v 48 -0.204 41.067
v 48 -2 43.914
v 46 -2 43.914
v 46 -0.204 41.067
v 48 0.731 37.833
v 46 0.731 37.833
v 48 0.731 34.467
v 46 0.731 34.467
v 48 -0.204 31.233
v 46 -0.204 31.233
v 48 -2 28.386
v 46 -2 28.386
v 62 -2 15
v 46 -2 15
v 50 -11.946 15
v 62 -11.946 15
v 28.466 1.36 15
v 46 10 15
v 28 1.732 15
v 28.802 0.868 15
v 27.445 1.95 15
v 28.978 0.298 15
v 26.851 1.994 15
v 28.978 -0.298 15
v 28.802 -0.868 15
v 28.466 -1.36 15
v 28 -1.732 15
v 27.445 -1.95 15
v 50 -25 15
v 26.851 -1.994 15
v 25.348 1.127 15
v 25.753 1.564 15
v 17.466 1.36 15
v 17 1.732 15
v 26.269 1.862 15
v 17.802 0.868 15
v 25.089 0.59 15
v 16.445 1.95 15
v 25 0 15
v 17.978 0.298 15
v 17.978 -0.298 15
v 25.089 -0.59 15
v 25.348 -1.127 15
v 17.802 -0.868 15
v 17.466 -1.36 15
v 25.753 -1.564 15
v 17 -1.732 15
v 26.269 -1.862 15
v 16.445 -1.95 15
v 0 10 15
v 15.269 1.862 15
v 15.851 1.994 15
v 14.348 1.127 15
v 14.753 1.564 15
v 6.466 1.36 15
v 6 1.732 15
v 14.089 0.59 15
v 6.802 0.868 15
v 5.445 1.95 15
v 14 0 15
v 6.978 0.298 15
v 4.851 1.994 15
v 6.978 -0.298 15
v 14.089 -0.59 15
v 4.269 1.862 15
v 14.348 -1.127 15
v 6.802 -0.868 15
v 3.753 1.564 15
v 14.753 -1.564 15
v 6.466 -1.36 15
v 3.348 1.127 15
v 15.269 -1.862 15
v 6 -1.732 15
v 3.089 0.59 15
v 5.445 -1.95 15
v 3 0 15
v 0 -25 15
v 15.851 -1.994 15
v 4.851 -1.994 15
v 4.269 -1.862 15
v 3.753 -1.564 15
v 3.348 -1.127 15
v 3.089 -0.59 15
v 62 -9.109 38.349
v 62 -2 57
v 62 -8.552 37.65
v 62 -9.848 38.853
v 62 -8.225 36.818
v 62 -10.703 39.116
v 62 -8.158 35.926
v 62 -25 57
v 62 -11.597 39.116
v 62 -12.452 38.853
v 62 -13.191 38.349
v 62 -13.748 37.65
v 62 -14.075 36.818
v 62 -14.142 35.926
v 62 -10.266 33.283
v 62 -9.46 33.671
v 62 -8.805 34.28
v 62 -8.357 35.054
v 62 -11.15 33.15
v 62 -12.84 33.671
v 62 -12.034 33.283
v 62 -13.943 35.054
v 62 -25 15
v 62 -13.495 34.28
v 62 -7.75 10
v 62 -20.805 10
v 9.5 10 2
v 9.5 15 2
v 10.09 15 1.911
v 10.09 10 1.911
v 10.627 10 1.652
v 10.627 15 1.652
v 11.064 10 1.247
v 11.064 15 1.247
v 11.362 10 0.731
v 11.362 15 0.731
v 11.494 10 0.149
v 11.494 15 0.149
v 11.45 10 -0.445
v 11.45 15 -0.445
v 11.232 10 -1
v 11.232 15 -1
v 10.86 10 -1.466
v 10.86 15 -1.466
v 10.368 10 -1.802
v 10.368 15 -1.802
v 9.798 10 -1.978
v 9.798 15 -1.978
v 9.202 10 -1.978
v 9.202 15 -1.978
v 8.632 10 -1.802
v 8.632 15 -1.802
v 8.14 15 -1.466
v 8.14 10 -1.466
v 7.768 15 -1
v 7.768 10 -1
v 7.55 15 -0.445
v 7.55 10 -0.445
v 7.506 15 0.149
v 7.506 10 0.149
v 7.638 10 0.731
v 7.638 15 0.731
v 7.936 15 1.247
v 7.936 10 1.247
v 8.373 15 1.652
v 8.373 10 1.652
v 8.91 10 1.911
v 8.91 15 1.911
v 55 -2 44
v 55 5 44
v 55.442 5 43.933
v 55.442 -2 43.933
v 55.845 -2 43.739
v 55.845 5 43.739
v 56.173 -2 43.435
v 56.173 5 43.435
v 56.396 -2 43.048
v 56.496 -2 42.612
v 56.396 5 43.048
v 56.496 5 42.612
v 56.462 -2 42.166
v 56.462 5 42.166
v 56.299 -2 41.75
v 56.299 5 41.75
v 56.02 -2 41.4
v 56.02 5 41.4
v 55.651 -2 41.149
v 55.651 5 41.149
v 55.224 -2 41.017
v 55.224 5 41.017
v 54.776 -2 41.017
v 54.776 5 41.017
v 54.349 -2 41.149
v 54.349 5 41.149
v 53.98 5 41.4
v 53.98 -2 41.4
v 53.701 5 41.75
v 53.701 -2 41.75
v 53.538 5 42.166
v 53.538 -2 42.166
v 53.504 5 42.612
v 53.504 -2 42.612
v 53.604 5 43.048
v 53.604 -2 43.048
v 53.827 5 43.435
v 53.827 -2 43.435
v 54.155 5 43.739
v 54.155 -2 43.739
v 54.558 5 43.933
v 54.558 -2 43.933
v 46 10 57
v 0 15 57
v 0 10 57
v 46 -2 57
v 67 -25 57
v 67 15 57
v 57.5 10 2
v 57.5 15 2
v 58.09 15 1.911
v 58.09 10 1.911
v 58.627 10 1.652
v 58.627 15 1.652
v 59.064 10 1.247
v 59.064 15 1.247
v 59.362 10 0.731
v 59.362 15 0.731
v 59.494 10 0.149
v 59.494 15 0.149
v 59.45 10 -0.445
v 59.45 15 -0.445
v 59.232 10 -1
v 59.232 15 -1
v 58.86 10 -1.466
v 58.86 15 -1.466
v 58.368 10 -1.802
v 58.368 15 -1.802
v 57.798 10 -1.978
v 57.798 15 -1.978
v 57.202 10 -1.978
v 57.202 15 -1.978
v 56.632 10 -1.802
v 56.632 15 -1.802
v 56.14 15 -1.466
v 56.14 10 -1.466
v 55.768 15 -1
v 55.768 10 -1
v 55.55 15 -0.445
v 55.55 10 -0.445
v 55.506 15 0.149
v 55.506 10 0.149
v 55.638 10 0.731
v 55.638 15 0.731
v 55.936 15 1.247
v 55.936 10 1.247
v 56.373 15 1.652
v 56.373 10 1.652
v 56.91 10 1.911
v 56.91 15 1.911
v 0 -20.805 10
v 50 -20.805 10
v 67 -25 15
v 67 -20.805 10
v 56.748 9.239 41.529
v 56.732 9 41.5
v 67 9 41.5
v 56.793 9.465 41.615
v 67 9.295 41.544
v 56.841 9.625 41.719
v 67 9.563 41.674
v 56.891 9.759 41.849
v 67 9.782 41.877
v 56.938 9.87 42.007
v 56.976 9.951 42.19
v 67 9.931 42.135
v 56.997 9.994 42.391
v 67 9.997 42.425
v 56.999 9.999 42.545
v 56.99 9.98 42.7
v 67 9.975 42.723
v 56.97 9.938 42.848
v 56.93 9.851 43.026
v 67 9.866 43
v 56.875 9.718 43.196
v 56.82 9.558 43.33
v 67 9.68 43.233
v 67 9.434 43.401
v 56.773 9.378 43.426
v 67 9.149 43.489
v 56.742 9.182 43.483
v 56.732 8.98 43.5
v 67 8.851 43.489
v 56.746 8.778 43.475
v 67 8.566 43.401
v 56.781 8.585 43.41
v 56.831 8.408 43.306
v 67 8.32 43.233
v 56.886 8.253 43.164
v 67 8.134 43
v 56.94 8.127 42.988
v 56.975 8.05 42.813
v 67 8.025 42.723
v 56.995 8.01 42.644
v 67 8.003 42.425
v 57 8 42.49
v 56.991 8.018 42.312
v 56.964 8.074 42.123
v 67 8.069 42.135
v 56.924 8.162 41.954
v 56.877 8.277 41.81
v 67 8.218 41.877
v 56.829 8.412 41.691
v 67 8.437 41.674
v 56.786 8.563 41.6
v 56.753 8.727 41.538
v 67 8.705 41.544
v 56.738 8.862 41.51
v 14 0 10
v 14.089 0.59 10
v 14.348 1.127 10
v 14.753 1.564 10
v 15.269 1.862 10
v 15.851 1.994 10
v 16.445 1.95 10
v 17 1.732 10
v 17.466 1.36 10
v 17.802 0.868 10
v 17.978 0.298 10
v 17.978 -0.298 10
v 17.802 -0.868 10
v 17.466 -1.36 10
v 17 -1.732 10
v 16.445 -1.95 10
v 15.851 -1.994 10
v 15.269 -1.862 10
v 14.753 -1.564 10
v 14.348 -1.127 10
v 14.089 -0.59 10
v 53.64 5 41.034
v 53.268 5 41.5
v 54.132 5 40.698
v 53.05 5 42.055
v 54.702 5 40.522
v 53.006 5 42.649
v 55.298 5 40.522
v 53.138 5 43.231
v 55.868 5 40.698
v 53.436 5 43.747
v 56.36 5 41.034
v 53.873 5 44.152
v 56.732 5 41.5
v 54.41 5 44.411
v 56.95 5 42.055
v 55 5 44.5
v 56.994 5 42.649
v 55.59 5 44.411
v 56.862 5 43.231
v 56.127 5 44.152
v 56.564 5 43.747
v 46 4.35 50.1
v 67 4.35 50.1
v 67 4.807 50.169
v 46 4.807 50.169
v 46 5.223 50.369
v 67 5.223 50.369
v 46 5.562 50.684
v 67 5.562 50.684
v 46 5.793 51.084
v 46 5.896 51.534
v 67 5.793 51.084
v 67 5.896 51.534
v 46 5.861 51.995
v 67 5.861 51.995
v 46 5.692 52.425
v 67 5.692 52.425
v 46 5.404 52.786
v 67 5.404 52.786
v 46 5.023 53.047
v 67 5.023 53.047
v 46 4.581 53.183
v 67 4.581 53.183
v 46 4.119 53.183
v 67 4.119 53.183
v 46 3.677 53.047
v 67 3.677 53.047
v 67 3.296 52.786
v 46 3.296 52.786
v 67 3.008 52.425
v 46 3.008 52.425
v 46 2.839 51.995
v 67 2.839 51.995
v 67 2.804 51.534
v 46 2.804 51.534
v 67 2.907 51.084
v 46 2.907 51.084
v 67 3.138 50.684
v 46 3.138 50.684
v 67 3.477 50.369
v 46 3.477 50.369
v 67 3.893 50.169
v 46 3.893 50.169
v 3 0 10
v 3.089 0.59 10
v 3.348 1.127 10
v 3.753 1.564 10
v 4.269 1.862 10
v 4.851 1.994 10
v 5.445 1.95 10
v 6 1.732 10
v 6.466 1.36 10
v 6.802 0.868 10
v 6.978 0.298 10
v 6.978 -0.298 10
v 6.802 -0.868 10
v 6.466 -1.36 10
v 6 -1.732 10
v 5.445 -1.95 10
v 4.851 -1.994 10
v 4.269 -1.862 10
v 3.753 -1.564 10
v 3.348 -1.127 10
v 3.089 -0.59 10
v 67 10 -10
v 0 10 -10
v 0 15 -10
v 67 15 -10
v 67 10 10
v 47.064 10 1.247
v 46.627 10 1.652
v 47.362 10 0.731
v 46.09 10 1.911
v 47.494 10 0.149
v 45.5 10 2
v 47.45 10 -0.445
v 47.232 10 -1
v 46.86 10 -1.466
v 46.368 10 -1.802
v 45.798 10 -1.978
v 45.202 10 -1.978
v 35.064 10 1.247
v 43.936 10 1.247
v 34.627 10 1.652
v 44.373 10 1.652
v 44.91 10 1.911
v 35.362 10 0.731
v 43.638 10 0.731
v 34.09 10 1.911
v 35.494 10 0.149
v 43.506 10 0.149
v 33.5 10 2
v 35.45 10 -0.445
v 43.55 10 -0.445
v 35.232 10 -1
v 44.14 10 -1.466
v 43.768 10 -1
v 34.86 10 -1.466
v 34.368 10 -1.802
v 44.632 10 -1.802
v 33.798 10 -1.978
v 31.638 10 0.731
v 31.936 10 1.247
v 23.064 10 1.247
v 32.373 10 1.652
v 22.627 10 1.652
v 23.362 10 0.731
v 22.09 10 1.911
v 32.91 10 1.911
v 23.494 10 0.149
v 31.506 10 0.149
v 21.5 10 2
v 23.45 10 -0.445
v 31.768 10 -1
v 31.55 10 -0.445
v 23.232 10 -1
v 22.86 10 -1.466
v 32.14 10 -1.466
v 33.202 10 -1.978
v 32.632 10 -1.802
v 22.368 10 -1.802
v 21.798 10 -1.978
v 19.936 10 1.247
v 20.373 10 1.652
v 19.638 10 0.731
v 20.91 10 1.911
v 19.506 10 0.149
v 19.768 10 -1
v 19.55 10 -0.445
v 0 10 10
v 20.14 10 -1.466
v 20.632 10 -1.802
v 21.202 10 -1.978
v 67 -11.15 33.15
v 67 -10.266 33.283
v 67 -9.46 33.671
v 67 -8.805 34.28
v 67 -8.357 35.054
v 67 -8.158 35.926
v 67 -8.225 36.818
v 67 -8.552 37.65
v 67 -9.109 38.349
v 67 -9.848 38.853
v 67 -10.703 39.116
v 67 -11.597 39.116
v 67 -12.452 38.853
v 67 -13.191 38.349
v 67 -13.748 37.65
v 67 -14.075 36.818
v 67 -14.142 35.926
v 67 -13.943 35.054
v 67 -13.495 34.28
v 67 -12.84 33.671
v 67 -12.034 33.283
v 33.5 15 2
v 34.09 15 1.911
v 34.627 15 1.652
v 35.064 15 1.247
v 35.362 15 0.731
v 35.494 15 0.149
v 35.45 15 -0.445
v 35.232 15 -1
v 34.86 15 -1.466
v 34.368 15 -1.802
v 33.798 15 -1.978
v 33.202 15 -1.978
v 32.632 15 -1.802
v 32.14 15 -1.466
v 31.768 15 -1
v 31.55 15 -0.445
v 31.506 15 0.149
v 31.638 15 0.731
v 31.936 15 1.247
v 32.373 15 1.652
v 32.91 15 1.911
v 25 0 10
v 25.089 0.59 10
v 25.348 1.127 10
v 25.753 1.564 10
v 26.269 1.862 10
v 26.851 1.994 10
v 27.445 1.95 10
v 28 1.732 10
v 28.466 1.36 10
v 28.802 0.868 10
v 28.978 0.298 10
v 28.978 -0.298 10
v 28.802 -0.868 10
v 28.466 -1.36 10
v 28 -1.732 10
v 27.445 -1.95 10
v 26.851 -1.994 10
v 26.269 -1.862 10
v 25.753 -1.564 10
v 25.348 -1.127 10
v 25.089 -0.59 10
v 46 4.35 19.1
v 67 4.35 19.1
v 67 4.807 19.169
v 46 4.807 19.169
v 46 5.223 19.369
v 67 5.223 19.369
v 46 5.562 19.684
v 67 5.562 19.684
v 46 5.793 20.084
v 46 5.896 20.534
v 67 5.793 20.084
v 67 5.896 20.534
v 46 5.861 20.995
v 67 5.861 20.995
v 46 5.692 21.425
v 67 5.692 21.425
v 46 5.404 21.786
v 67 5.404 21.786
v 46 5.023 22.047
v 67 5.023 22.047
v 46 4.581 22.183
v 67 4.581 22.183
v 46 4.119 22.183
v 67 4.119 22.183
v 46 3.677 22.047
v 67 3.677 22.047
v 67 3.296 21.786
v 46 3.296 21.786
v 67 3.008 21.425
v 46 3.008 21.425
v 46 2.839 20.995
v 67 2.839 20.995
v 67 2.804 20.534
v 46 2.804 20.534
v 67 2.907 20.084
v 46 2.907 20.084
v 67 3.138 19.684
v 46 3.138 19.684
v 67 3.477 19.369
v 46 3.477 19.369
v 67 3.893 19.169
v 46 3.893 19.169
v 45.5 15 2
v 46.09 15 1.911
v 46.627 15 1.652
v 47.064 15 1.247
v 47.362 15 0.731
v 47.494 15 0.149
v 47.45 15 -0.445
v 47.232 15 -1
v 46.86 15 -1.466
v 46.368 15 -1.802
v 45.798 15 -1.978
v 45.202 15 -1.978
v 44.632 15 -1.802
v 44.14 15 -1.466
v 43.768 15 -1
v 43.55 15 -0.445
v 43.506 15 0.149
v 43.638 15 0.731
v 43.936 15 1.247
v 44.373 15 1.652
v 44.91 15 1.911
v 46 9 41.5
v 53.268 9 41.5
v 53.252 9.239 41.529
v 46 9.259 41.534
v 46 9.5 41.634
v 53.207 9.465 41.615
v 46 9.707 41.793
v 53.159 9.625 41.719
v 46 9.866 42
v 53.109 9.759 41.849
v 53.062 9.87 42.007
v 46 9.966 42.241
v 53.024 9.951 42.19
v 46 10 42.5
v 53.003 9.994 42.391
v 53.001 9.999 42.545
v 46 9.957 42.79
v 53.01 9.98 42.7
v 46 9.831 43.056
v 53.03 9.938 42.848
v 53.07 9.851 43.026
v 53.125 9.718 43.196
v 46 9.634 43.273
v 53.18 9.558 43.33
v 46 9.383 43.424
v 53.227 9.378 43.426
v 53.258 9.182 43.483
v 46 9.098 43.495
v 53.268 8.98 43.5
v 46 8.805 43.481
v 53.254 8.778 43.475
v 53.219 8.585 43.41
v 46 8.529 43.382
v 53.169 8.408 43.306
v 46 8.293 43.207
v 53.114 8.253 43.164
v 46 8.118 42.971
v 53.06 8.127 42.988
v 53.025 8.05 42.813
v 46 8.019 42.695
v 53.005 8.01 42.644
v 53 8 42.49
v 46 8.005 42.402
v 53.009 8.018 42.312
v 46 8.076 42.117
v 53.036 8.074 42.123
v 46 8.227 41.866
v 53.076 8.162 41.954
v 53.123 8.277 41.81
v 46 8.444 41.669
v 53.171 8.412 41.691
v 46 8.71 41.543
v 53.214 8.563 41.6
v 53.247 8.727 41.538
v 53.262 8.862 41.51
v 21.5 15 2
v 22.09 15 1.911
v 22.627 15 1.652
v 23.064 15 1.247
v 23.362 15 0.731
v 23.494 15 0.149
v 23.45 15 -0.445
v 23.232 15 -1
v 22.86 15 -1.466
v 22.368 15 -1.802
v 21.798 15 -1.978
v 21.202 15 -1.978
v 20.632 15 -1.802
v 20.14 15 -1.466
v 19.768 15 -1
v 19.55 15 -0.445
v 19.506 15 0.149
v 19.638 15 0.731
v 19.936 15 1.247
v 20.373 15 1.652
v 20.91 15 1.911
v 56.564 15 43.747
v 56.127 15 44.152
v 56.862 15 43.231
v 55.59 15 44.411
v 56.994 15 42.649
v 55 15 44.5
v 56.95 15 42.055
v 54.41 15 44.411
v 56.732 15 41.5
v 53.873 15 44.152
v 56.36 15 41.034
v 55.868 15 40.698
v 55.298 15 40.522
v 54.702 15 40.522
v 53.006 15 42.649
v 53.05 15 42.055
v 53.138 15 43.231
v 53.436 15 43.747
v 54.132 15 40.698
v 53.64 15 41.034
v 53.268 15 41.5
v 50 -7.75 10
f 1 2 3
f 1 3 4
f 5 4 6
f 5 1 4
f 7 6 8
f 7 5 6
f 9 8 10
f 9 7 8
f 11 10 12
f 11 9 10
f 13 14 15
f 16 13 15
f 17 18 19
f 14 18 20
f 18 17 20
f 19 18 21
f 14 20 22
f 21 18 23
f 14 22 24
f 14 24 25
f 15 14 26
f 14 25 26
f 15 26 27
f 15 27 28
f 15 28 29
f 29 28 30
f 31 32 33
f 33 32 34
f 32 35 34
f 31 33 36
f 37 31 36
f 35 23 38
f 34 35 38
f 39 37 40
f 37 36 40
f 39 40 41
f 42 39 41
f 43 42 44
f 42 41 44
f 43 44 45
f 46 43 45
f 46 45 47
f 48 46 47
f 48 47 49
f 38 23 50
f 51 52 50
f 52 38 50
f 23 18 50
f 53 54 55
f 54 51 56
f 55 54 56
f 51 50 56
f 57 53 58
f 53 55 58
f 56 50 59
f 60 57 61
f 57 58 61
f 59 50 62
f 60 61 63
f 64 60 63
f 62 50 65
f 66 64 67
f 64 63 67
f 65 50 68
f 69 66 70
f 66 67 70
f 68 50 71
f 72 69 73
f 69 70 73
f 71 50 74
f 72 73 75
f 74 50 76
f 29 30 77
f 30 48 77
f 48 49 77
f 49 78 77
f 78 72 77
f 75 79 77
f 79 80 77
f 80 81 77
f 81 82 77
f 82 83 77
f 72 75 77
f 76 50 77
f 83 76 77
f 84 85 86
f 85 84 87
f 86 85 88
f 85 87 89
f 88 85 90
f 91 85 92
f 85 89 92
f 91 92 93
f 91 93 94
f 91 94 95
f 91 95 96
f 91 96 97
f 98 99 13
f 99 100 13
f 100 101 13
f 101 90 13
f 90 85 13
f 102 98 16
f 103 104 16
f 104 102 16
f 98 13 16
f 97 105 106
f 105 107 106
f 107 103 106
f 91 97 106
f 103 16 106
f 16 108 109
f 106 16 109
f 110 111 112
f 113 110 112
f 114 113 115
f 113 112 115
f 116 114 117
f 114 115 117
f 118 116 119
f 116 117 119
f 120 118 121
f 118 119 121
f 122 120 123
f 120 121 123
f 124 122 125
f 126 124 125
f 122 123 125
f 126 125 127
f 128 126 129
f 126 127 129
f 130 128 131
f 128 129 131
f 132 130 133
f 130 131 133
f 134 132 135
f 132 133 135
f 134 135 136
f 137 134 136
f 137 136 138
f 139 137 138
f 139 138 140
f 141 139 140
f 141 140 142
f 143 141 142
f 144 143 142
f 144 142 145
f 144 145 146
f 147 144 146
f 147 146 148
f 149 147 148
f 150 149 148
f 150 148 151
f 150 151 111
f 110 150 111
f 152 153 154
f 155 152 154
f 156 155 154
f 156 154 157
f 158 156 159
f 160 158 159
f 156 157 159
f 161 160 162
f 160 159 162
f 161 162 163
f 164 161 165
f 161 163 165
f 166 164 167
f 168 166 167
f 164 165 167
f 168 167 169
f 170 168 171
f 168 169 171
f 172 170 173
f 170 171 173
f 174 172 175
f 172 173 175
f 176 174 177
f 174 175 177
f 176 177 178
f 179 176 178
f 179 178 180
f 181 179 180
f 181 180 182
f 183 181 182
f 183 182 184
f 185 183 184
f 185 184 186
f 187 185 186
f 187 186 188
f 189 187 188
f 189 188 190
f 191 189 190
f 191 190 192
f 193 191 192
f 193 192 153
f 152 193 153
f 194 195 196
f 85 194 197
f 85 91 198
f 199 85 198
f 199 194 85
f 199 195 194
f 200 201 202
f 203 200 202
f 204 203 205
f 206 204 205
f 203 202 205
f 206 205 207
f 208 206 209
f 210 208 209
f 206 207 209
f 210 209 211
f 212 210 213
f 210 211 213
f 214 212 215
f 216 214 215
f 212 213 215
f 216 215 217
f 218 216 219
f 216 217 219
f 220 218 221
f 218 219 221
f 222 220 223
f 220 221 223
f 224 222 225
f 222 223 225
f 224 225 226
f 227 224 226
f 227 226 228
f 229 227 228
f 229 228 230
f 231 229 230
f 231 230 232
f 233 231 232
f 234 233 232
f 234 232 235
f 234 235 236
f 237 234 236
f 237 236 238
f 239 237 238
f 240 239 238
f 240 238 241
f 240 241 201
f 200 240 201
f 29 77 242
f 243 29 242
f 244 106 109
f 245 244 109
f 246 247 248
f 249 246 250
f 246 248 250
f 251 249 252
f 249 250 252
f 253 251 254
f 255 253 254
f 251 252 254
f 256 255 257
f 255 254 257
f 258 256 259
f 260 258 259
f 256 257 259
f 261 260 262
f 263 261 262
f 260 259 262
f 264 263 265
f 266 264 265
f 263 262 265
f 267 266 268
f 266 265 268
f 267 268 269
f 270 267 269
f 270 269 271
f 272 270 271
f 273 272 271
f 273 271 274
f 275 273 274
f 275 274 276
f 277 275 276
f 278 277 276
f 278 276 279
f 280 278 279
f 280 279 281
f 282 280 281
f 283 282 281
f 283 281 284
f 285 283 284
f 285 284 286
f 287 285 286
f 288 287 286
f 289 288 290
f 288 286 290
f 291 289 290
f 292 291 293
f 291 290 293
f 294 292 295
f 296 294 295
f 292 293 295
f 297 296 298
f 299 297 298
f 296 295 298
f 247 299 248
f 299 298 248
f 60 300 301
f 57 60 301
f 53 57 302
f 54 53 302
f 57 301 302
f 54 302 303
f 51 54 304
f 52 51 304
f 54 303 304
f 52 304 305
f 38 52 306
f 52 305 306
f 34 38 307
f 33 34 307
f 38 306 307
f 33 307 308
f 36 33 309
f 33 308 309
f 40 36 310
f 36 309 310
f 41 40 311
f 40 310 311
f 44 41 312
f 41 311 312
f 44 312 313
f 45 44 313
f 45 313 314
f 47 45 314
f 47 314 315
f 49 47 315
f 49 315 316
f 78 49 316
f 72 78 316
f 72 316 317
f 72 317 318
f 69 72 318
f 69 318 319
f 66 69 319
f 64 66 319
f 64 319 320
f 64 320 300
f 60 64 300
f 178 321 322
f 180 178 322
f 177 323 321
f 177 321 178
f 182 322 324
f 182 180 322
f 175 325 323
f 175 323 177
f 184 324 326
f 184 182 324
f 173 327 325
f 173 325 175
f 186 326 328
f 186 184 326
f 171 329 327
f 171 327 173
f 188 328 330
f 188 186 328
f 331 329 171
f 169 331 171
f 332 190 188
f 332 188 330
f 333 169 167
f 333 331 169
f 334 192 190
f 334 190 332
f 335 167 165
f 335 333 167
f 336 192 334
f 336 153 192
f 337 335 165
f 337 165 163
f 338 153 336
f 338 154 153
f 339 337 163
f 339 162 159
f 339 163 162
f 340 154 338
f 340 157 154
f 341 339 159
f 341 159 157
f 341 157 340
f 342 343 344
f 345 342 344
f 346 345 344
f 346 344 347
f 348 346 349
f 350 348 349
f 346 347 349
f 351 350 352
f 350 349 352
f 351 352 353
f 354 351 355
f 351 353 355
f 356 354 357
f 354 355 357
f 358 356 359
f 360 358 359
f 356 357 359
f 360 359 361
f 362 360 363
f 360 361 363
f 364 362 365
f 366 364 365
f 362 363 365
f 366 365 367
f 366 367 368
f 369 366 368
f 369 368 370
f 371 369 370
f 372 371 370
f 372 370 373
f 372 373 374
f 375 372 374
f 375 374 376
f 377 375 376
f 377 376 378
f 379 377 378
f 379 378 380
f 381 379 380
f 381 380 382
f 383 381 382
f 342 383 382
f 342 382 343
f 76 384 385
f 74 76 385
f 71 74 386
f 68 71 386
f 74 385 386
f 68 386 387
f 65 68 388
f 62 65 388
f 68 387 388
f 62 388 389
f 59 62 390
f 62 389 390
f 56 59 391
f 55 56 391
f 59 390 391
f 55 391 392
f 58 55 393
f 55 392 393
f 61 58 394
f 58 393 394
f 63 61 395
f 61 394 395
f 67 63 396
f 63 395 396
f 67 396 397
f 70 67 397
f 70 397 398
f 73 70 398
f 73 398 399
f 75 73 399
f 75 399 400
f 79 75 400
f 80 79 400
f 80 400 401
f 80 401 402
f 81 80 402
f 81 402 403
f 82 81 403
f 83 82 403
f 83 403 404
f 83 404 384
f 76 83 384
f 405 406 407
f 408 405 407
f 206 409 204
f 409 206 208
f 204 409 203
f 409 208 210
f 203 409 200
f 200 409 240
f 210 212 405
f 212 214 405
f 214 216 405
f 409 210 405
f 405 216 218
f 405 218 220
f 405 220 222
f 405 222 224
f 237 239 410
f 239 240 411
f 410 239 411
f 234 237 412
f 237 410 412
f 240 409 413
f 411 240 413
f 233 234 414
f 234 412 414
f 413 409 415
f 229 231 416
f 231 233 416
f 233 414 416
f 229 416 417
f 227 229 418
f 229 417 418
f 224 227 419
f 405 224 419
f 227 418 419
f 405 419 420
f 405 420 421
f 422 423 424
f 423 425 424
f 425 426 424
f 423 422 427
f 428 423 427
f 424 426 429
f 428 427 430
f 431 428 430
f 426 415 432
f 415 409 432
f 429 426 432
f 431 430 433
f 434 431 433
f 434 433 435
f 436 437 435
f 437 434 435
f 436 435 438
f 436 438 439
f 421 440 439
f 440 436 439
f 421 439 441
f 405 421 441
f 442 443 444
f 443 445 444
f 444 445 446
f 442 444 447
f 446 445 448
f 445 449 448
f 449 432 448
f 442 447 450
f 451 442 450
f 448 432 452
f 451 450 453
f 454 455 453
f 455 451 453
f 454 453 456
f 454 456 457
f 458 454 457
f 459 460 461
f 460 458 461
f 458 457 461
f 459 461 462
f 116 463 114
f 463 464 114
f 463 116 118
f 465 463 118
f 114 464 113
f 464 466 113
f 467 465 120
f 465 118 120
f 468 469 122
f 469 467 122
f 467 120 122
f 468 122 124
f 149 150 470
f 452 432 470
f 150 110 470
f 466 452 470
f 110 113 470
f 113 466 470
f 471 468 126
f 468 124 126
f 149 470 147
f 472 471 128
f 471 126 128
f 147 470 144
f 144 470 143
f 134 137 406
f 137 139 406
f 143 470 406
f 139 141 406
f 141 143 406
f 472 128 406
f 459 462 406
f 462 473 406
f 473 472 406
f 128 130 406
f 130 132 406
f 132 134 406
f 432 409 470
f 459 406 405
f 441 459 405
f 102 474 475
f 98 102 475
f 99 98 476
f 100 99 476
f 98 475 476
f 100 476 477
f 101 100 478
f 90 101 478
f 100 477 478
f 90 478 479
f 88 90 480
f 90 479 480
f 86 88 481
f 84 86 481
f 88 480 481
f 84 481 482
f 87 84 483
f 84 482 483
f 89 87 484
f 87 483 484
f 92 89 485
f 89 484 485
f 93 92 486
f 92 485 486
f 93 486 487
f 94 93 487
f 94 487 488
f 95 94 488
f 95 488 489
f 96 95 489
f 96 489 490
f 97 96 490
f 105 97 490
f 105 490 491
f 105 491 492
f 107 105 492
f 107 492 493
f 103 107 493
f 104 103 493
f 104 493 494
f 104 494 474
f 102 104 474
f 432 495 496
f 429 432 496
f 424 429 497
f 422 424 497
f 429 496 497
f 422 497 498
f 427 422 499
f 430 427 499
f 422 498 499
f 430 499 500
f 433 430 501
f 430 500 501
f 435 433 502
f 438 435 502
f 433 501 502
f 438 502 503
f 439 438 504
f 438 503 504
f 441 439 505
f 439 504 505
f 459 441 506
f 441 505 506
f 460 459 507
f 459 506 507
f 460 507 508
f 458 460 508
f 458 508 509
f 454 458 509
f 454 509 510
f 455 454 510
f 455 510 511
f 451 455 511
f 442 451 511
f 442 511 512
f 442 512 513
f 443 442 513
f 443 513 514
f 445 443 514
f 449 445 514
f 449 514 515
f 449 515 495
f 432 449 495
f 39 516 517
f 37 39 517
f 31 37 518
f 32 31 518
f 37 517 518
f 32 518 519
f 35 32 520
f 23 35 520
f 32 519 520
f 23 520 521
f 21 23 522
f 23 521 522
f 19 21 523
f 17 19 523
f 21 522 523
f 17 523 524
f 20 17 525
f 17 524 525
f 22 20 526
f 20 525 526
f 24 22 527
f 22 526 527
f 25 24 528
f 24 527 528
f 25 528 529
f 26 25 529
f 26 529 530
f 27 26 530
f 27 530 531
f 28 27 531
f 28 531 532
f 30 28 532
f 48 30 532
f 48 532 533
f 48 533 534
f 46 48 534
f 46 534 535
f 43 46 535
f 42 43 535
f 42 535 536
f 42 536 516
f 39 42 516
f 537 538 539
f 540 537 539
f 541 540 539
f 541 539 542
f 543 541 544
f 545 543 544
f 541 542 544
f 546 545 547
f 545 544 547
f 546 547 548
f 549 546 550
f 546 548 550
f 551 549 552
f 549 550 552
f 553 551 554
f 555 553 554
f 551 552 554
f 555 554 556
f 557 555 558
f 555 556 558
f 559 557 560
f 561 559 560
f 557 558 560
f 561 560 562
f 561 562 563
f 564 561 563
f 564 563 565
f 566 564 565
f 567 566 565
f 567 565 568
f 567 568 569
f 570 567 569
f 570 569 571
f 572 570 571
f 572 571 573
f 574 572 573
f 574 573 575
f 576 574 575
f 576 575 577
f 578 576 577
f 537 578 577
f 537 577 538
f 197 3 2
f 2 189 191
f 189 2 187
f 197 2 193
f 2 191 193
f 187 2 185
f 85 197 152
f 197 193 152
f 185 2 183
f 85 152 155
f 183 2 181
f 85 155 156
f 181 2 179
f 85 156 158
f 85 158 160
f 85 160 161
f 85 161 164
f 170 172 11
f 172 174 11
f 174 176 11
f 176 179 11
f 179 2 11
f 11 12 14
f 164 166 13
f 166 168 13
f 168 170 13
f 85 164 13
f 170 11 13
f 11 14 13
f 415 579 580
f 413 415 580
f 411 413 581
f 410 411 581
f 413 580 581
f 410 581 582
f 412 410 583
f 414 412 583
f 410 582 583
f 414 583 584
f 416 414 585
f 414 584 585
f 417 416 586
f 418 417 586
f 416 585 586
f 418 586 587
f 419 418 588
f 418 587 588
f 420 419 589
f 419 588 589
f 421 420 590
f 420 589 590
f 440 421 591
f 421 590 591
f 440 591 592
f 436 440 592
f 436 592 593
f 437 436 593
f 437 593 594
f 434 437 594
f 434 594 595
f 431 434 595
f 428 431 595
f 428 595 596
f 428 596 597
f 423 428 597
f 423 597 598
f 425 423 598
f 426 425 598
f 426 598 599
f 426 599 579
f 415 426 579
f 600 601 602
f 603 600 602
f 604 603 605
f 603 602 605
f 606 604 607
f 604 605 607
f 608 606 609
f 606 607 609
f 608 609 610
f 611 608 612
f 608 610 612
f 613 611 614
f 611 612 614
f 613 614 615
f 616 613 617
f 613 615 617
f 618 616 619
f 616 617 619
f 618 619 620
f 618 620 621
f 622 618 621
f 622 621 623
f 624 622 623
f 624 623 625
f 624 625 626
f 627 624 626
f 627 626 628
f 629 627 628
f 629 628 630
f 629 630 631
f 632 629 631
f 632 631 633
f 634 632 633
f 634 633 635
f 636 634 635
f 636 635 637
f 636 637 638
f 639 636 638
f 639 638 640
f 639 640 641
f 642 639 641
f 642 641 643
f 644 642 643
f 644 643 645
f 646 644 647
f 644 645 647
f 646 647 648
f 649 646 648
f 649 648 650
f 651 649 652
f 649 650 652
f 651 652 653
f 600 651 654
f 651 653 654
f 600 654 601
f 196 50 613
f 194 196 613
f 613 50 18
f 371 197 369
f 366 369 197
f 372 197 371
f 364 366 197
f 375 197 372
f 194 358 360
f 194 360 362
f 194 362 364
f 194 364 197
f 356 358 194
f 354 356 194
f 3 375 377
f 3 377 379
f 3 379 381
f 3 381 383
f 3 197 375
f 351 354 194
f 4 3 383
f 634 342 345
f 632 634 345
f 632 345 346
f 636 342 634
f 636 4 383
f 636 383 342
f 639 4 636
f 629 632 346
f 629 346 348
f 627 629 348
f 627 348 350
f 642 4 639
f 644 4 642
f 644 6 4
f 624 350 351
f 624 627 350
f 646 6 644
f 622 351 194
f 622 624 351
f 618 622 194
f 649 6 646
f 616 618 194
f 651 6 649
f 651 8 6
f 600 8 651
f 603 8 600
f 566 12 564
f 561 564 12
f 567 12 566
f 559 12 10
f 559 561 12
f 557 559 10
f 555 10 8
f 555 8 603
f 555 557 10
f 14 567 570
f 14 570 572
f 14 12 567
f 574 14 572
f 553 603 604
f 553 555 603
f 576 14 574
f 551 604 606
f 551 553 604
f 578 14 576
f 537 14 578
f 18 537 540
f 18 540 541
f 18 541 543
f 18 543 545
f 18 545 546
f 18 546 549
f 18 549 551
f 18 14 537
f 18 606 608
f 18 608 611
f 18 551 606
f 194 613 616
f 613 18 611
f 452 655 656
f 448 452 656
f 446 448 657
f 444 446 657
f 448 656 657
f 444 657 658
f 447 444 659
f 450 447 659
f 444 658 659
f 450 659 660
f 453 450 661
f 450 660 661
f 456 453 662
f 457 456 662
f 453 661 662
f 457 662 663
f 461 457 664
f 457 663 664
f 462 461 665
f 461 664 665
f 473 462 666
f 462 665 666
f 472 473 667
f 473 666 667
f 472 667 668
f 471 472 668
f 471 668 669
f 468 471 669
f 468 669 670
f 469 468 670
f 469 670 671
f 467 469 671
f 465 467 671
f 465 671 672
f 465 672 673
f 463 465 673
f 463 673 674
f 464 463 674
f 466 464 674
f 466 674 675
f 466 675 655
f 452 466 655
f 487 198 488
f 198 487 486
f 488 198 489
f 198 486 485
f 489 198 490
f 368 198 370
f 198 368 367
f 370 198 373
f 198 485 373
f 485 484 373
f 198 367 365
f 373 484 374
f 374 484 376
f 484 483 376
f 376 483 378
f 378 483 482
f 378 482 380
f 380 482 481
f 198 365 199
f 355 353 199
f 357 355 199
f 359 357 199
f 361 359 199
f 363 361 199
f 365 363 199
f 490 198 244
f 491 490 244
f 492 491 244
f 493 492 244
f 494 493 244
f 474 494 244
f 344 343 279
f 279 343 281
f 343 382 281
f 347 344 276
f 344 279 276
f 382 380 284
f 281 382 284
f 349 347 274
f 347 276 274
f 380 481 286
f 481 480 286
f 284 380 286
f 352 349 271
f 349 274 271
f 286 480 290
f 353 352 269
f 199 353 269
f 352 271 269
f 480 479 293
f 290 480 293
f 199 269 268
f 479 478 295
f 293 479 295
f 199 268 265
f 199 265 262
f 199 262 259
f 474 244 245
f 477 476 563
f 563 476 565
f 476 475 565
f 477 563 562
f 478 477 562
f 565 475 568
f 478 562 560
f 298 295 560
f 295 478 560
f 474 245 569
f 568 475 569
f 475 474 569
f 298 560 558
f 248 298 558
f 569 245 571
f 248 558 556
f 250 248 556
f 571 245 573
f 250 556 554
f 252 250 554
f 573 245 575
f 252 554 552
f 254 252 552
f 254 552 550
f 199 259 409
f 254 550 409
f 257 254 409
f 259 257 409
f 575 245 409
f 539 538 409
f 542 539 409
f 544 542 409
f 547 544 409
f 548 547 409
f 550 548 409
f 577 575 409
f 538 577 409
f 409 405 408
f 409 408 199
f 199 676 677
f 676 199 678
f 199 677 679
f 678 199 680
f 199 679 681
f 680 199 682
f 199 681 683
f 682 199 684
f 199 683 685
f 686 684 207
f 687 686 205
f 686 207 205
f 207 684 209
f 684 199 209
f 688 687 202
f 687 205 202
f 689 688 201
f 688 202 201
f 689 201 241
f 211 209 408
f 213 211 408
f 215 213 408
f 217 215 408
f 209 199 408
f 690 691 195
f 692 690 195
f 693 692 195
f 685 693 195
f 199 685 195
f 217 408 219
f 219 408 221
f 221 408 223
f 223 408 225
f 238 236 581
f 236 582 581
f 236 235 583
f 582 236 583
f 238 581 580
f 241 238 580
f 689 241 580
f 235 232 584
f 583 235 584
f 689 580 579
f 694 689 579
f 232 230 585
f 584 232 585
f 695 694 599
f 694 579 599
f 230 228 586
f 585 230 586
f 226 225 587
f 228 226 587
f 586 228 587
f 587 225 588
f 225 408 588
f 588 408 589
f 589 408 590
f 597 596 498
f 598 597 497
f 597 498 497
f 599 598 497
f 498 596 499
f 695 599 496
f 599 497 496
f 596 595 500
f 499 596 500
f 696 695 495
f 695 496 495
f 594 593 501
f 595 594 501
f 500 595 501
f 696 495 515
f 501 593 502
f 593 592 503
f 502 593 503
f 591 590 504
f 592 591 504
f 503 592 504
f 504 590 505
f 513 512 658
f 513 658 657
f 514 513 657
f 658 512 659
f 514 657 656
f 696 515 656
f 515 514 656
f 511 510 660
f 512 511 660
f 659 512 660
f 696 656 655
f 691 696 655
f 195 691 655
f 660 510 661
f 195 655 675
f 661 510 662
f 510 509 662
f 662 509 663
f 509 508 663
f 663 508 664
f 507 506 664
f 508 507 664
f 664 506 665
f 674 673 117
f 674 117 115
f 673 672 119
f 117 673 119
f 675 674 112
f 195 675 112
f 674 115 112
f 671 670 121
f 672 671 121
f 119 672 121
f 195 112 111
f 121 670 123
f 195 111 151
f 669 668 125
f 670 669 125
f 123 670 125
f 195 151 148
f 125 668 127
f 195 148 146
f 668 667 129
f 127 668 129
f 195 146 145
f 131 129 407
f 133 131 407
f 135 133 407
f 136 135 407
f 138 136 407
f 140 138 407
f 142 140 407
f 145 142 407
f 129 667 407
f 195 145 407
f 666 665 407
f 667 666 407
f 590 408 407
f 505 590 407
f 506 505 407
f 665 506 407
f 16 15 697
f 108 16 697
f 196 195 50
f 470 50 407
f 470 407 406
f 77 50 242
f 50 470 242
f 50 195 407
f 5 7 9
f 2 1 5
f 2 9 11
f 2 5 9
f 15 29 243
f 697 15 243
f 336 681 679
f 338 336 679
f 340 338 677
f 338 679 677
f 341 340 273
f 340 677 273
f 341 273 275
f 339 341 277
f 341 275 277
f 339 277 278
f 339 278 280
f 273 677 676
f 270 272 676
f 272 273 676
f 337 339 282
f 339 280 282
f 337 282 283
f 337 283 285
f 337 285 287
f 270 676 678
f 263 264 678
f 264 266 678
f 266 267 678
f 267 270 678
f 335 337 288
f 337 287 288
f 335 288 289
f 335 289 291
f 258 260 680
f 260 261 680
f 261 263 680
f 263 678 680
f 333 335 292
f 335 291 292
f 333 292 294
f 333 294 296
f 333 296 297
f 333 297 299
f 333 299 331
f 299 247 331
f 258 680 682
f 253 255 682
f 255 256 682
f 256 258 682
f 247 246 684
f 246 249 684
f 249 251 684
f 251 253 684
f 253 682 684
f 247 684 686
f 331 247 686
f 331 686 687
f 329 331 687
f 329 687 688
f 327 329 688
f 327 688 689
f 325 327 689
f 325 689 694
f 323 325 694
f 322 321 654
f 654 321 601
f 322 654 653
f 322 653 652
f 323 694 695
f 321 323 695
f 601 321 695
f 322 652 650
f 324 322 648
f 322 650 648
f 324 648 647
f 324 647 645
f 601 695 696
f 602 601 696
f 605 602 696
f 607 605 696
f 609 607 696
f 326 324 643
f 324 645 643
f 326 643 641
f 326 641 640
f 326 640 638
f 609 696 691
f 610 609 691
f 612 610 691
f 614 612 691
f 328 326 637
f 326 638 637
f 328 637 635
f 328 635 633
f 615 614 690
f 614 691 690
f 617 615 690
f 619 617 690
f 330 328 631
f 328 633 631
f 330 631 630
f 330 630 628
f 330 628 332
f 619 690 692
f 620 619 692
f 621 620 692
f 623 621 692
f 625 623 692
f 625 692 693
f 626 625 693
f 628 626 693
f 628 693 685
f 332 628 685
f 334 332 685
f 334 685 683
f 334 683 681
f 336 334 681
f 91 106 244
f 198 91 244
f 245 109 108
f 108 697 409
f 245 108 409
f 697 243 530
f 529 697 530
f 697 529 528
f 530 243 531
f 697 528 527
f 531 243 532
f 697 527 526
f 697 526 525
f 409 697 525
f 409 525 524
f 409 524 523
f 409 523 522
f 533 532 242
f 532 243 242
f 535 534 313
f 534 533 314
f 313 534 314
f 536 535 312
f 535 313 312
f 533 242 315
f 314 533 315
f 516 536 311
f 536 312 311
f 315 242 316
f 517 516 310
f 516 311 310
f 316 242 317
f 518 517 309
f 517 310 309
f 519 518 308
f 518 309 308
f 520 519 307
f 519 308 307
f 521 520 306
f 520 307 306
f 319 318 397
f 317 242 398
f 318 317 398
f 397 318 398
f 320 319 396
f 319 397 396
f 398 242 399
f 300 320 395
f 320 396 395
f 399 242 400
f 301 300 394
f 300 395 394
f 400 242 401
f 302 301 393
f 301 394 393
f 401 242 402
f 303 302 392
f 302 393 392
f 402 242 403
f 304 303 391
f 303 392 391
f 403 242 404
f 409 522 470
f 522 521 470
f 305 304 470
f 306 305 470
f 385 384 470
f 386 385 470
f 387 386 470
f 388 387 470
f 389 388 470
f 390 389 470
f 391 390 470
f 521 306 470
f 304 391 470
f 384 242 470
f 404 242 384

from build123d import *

# Parameters (mm, degrees)
BOSS_EXTRUDE1_DEPTH = 50
BOSS_EXTRUDE2_DEPTH = 12
BOSS_EXTRUDE3_DEPTH = 5
SKETCH5_W           = 16
SKETCH5_H           = 12
BOSS_EXTRUDE4_DEPTH = 42
SKETCH6_R           = 3
CUT_EXTRUDE1_DEPTH  = 92.449439583
CUT_EXTRUDE2_START  = 14
SKETCH7_R           = 12
CUT_EXTRUDE2_DEPTH  = 74.852148522
SKETCH8_R           = 1.55
CUT_EXTRUDE3_DEPTH  = 92.449439583
SKETCH9_R           = 1.5
CUT_EXTRUDE4_DEPTH  = 42
SKETCH10_R          = 2
CUT_EXTRUDE5_DEPTH  = 10
SKETCH11_R          = 1
CUT_EXTRUDE6_DEPTH  = 92.449439583
SKETCH12_R          = 2
CUT_EXTRUDE7_DEPTH  = 10
SKETCH13_R          = 2
CUT_EXTRUDE8_DEPTH  = 10


with BuildPart() as part:
    # Sketch1 → Boss-Extrude1 (new body)
    with BuildSketch(Plane(origin=(0, 0, 0), x_dir=(0, 0, -1), z_dir=(1, 0, 0))):
        Polygon((-15, 15), (-15, -25), (-10, -20.804501844), (-10, -10), (-10, 10), (10, 10), (10, 15), align=None)
    extrude(amount=BOSS_EXTRUDE1_DEPTH)

    # Sketch2 → Boss-Extrude2 (add)
    with BuildSketch(Plane(origin=(50, 0, 0), x_dir=(0, 0, -1), z_dir=(1, 0, 0))):
        Polygon((-15, 15), (-15, -11.945927107), (-10, -7.750428951), (-10, 10), (10, 10), (10, 15), align=None)
    extrude(amount=BOSS_EXTRUDE2_DEPTH)

    # Sketch4 → Boss-Extrude3 (add)
    with BuildSketch(Plane(origin=(62, 0, 0), x_dir=(0, 0, -1), z_dir=(1, 0, 0))):
        Polygon((10, 15), (-15, 15), (-15, -11.945927107), (-10, -7.750428951), (-10, 10), (10, 10), align=None)
        Polygon((-15, -25), (-10, -20.804501844), (-10, -7.750428951), (-15, -11.945927107), align=None)
    extrude(amount=BOSS_EXTRUDE3_DEPTH)

    # Sketch5 → Boss-Extrude4 (add)
    with BuildSketch(Plane.XY.offset(15)):
        Polygon((67, 15), (0, 15), (0, 10), (46, 10), (62, 10), (67, 10), align=None)
        with Locations((54, 4)):
            Rectangle(SKETCH5_W, SKETCH5_H)
        Polygon((67, -25), (67, 10), (62, 10), (62, -2), (62, -11.945927107), (62, -25), align=None)
    extrude(amount=BOSS_EXTRUDE4_DEPTH)

    # Sketch6 → Cut-Extrude1 (cut, through all)
    with BuildSketch(Plane(origin=(67, 0, 0), x_dir=(0, 0, -1), z_dir=(1, 0, 0))):
        with Locations((-36.15, -11.15)):
            Circle(SKETCH6_R)
    extrude(amount=-CUT_EXTRUDE1_DEPTH, mode=Mode.SUBTRACT)

    # Sketch7 → Cut-Extrude2 (cut, through all)
    with BuildSketch(Plane.ZY.offset(-62).offset(CUT_EXTRUDE2_START)):
        with Locations((36.15, -11.15)):
            Circle(SKETCH7_R)
    extrude(amount=CUT_EXTRUDE2_DEPTH, mode=Mode.SUBTRACT)

    # Sketch8 → Cut-Extrude3 (cut, through all)
    with BuildSketch(Plane(origin=(67, 0, 0), x_dir=(0, 0, -1), z_dir=(1, 0, 0))):
        with Locations((-51.65, 4.35)):
            Circle(SKETCH8_R)
        with Locations((-20.65, 4.35)):
            Circle(SKETCH8_R)
    extrude(amount=-CUT_EXTRUDE3_DEPTH, mode=Mode.SUBTRACT)

    # Sketch9 → Cut-Extrude4 (cut)
    with BuildSketch(Plane(origin=(0, 15, 0), x_dir=(1, 0, 0), z_dir=(0, 1, 0))):
        with Locations(Location((55, -42.5, 0), (0, 0, 270))):
            Circle(SKETCH9_R)
    extrude(amount=-CUT_EXTRUDE4_DEPTH, mode=Mode.SUBTRACT)

    # Sketch10 → Cut-Extrude5 (cut)
    with BuildSketch(Plane(origin=(0, 15, 0), x_dir=(1, 0, 0), z_dir=(0, 1, 0))):
        with Locations(Location((55, -42.5, 0), (0, 0, 270))):
            Circle(SKETCH10_R)
    extrude(amount=-CUT_EXTRUDE5_DEPTH, mode=Mode.SUBTRACT)

    # Sketch11 → Cut-Extrude6 (cut, through all)
    with BuildSketch(Plane(origin=(67, 0, 0), x_dir=(0, 0, -1), z_dir=(1, 0, 0))):
        with Locations((-42.5, 9)):
            Circle(SKETCH11_R)
    extrude(amount=-CUT_EXTRUDE6_DEPTH, mode=Mode.SUBTRACT)

    # Sketch12 → Cut-Extrude7 (cut)
    with BuildSketch(Plane(origin=(0, 15, 0), x_dir=(1, 0, 0), z_dir=(0, 1, 0))):
        with Locations(Location((9.5, 0, 0), (0, 0, 270))):
            Circle(SKETCH12_R)
        with Locations(Location((21.5, 0, 0), (0, 0, 270))):
            Circle(SKETCH12_R)
        with Locations(Location((33.5, 0, 0), (0, 0, 270))):
            Circle(SKETCH12_R)
        with Locations(Location((45.5, 0, 0), (0, 0, 270))):
            Circle(SKETCH12_R)
        with Locations(Location((57.5, 0, 0), (0, 0, 270))):
            Circle(SKETCH12_R)
    extrude(amount=-CUT_EXTRUDE7_DEPTH, mode=Mode.SUBTRACT)

    # Sketch13 → Cut-Extrude8 (cut)
    with BuildSketch(Plane(origin=(0, 0, 10), x_dir=(-1, 0, 0), z_dir=(0, 0, -1))):
        with Locations((-5, 0)):
            Circle(SKETCH13_R)
        with Locations((-16, 0)):
            Circle(SKETCH13_R)
        with Locations((-27, 0)):
            Circle(SKETCH13_R)
    extrude(amount=-CUT_EXTRUDE8_DEPTH, mode=Mode.SUBTRACT)


solid = part.part
